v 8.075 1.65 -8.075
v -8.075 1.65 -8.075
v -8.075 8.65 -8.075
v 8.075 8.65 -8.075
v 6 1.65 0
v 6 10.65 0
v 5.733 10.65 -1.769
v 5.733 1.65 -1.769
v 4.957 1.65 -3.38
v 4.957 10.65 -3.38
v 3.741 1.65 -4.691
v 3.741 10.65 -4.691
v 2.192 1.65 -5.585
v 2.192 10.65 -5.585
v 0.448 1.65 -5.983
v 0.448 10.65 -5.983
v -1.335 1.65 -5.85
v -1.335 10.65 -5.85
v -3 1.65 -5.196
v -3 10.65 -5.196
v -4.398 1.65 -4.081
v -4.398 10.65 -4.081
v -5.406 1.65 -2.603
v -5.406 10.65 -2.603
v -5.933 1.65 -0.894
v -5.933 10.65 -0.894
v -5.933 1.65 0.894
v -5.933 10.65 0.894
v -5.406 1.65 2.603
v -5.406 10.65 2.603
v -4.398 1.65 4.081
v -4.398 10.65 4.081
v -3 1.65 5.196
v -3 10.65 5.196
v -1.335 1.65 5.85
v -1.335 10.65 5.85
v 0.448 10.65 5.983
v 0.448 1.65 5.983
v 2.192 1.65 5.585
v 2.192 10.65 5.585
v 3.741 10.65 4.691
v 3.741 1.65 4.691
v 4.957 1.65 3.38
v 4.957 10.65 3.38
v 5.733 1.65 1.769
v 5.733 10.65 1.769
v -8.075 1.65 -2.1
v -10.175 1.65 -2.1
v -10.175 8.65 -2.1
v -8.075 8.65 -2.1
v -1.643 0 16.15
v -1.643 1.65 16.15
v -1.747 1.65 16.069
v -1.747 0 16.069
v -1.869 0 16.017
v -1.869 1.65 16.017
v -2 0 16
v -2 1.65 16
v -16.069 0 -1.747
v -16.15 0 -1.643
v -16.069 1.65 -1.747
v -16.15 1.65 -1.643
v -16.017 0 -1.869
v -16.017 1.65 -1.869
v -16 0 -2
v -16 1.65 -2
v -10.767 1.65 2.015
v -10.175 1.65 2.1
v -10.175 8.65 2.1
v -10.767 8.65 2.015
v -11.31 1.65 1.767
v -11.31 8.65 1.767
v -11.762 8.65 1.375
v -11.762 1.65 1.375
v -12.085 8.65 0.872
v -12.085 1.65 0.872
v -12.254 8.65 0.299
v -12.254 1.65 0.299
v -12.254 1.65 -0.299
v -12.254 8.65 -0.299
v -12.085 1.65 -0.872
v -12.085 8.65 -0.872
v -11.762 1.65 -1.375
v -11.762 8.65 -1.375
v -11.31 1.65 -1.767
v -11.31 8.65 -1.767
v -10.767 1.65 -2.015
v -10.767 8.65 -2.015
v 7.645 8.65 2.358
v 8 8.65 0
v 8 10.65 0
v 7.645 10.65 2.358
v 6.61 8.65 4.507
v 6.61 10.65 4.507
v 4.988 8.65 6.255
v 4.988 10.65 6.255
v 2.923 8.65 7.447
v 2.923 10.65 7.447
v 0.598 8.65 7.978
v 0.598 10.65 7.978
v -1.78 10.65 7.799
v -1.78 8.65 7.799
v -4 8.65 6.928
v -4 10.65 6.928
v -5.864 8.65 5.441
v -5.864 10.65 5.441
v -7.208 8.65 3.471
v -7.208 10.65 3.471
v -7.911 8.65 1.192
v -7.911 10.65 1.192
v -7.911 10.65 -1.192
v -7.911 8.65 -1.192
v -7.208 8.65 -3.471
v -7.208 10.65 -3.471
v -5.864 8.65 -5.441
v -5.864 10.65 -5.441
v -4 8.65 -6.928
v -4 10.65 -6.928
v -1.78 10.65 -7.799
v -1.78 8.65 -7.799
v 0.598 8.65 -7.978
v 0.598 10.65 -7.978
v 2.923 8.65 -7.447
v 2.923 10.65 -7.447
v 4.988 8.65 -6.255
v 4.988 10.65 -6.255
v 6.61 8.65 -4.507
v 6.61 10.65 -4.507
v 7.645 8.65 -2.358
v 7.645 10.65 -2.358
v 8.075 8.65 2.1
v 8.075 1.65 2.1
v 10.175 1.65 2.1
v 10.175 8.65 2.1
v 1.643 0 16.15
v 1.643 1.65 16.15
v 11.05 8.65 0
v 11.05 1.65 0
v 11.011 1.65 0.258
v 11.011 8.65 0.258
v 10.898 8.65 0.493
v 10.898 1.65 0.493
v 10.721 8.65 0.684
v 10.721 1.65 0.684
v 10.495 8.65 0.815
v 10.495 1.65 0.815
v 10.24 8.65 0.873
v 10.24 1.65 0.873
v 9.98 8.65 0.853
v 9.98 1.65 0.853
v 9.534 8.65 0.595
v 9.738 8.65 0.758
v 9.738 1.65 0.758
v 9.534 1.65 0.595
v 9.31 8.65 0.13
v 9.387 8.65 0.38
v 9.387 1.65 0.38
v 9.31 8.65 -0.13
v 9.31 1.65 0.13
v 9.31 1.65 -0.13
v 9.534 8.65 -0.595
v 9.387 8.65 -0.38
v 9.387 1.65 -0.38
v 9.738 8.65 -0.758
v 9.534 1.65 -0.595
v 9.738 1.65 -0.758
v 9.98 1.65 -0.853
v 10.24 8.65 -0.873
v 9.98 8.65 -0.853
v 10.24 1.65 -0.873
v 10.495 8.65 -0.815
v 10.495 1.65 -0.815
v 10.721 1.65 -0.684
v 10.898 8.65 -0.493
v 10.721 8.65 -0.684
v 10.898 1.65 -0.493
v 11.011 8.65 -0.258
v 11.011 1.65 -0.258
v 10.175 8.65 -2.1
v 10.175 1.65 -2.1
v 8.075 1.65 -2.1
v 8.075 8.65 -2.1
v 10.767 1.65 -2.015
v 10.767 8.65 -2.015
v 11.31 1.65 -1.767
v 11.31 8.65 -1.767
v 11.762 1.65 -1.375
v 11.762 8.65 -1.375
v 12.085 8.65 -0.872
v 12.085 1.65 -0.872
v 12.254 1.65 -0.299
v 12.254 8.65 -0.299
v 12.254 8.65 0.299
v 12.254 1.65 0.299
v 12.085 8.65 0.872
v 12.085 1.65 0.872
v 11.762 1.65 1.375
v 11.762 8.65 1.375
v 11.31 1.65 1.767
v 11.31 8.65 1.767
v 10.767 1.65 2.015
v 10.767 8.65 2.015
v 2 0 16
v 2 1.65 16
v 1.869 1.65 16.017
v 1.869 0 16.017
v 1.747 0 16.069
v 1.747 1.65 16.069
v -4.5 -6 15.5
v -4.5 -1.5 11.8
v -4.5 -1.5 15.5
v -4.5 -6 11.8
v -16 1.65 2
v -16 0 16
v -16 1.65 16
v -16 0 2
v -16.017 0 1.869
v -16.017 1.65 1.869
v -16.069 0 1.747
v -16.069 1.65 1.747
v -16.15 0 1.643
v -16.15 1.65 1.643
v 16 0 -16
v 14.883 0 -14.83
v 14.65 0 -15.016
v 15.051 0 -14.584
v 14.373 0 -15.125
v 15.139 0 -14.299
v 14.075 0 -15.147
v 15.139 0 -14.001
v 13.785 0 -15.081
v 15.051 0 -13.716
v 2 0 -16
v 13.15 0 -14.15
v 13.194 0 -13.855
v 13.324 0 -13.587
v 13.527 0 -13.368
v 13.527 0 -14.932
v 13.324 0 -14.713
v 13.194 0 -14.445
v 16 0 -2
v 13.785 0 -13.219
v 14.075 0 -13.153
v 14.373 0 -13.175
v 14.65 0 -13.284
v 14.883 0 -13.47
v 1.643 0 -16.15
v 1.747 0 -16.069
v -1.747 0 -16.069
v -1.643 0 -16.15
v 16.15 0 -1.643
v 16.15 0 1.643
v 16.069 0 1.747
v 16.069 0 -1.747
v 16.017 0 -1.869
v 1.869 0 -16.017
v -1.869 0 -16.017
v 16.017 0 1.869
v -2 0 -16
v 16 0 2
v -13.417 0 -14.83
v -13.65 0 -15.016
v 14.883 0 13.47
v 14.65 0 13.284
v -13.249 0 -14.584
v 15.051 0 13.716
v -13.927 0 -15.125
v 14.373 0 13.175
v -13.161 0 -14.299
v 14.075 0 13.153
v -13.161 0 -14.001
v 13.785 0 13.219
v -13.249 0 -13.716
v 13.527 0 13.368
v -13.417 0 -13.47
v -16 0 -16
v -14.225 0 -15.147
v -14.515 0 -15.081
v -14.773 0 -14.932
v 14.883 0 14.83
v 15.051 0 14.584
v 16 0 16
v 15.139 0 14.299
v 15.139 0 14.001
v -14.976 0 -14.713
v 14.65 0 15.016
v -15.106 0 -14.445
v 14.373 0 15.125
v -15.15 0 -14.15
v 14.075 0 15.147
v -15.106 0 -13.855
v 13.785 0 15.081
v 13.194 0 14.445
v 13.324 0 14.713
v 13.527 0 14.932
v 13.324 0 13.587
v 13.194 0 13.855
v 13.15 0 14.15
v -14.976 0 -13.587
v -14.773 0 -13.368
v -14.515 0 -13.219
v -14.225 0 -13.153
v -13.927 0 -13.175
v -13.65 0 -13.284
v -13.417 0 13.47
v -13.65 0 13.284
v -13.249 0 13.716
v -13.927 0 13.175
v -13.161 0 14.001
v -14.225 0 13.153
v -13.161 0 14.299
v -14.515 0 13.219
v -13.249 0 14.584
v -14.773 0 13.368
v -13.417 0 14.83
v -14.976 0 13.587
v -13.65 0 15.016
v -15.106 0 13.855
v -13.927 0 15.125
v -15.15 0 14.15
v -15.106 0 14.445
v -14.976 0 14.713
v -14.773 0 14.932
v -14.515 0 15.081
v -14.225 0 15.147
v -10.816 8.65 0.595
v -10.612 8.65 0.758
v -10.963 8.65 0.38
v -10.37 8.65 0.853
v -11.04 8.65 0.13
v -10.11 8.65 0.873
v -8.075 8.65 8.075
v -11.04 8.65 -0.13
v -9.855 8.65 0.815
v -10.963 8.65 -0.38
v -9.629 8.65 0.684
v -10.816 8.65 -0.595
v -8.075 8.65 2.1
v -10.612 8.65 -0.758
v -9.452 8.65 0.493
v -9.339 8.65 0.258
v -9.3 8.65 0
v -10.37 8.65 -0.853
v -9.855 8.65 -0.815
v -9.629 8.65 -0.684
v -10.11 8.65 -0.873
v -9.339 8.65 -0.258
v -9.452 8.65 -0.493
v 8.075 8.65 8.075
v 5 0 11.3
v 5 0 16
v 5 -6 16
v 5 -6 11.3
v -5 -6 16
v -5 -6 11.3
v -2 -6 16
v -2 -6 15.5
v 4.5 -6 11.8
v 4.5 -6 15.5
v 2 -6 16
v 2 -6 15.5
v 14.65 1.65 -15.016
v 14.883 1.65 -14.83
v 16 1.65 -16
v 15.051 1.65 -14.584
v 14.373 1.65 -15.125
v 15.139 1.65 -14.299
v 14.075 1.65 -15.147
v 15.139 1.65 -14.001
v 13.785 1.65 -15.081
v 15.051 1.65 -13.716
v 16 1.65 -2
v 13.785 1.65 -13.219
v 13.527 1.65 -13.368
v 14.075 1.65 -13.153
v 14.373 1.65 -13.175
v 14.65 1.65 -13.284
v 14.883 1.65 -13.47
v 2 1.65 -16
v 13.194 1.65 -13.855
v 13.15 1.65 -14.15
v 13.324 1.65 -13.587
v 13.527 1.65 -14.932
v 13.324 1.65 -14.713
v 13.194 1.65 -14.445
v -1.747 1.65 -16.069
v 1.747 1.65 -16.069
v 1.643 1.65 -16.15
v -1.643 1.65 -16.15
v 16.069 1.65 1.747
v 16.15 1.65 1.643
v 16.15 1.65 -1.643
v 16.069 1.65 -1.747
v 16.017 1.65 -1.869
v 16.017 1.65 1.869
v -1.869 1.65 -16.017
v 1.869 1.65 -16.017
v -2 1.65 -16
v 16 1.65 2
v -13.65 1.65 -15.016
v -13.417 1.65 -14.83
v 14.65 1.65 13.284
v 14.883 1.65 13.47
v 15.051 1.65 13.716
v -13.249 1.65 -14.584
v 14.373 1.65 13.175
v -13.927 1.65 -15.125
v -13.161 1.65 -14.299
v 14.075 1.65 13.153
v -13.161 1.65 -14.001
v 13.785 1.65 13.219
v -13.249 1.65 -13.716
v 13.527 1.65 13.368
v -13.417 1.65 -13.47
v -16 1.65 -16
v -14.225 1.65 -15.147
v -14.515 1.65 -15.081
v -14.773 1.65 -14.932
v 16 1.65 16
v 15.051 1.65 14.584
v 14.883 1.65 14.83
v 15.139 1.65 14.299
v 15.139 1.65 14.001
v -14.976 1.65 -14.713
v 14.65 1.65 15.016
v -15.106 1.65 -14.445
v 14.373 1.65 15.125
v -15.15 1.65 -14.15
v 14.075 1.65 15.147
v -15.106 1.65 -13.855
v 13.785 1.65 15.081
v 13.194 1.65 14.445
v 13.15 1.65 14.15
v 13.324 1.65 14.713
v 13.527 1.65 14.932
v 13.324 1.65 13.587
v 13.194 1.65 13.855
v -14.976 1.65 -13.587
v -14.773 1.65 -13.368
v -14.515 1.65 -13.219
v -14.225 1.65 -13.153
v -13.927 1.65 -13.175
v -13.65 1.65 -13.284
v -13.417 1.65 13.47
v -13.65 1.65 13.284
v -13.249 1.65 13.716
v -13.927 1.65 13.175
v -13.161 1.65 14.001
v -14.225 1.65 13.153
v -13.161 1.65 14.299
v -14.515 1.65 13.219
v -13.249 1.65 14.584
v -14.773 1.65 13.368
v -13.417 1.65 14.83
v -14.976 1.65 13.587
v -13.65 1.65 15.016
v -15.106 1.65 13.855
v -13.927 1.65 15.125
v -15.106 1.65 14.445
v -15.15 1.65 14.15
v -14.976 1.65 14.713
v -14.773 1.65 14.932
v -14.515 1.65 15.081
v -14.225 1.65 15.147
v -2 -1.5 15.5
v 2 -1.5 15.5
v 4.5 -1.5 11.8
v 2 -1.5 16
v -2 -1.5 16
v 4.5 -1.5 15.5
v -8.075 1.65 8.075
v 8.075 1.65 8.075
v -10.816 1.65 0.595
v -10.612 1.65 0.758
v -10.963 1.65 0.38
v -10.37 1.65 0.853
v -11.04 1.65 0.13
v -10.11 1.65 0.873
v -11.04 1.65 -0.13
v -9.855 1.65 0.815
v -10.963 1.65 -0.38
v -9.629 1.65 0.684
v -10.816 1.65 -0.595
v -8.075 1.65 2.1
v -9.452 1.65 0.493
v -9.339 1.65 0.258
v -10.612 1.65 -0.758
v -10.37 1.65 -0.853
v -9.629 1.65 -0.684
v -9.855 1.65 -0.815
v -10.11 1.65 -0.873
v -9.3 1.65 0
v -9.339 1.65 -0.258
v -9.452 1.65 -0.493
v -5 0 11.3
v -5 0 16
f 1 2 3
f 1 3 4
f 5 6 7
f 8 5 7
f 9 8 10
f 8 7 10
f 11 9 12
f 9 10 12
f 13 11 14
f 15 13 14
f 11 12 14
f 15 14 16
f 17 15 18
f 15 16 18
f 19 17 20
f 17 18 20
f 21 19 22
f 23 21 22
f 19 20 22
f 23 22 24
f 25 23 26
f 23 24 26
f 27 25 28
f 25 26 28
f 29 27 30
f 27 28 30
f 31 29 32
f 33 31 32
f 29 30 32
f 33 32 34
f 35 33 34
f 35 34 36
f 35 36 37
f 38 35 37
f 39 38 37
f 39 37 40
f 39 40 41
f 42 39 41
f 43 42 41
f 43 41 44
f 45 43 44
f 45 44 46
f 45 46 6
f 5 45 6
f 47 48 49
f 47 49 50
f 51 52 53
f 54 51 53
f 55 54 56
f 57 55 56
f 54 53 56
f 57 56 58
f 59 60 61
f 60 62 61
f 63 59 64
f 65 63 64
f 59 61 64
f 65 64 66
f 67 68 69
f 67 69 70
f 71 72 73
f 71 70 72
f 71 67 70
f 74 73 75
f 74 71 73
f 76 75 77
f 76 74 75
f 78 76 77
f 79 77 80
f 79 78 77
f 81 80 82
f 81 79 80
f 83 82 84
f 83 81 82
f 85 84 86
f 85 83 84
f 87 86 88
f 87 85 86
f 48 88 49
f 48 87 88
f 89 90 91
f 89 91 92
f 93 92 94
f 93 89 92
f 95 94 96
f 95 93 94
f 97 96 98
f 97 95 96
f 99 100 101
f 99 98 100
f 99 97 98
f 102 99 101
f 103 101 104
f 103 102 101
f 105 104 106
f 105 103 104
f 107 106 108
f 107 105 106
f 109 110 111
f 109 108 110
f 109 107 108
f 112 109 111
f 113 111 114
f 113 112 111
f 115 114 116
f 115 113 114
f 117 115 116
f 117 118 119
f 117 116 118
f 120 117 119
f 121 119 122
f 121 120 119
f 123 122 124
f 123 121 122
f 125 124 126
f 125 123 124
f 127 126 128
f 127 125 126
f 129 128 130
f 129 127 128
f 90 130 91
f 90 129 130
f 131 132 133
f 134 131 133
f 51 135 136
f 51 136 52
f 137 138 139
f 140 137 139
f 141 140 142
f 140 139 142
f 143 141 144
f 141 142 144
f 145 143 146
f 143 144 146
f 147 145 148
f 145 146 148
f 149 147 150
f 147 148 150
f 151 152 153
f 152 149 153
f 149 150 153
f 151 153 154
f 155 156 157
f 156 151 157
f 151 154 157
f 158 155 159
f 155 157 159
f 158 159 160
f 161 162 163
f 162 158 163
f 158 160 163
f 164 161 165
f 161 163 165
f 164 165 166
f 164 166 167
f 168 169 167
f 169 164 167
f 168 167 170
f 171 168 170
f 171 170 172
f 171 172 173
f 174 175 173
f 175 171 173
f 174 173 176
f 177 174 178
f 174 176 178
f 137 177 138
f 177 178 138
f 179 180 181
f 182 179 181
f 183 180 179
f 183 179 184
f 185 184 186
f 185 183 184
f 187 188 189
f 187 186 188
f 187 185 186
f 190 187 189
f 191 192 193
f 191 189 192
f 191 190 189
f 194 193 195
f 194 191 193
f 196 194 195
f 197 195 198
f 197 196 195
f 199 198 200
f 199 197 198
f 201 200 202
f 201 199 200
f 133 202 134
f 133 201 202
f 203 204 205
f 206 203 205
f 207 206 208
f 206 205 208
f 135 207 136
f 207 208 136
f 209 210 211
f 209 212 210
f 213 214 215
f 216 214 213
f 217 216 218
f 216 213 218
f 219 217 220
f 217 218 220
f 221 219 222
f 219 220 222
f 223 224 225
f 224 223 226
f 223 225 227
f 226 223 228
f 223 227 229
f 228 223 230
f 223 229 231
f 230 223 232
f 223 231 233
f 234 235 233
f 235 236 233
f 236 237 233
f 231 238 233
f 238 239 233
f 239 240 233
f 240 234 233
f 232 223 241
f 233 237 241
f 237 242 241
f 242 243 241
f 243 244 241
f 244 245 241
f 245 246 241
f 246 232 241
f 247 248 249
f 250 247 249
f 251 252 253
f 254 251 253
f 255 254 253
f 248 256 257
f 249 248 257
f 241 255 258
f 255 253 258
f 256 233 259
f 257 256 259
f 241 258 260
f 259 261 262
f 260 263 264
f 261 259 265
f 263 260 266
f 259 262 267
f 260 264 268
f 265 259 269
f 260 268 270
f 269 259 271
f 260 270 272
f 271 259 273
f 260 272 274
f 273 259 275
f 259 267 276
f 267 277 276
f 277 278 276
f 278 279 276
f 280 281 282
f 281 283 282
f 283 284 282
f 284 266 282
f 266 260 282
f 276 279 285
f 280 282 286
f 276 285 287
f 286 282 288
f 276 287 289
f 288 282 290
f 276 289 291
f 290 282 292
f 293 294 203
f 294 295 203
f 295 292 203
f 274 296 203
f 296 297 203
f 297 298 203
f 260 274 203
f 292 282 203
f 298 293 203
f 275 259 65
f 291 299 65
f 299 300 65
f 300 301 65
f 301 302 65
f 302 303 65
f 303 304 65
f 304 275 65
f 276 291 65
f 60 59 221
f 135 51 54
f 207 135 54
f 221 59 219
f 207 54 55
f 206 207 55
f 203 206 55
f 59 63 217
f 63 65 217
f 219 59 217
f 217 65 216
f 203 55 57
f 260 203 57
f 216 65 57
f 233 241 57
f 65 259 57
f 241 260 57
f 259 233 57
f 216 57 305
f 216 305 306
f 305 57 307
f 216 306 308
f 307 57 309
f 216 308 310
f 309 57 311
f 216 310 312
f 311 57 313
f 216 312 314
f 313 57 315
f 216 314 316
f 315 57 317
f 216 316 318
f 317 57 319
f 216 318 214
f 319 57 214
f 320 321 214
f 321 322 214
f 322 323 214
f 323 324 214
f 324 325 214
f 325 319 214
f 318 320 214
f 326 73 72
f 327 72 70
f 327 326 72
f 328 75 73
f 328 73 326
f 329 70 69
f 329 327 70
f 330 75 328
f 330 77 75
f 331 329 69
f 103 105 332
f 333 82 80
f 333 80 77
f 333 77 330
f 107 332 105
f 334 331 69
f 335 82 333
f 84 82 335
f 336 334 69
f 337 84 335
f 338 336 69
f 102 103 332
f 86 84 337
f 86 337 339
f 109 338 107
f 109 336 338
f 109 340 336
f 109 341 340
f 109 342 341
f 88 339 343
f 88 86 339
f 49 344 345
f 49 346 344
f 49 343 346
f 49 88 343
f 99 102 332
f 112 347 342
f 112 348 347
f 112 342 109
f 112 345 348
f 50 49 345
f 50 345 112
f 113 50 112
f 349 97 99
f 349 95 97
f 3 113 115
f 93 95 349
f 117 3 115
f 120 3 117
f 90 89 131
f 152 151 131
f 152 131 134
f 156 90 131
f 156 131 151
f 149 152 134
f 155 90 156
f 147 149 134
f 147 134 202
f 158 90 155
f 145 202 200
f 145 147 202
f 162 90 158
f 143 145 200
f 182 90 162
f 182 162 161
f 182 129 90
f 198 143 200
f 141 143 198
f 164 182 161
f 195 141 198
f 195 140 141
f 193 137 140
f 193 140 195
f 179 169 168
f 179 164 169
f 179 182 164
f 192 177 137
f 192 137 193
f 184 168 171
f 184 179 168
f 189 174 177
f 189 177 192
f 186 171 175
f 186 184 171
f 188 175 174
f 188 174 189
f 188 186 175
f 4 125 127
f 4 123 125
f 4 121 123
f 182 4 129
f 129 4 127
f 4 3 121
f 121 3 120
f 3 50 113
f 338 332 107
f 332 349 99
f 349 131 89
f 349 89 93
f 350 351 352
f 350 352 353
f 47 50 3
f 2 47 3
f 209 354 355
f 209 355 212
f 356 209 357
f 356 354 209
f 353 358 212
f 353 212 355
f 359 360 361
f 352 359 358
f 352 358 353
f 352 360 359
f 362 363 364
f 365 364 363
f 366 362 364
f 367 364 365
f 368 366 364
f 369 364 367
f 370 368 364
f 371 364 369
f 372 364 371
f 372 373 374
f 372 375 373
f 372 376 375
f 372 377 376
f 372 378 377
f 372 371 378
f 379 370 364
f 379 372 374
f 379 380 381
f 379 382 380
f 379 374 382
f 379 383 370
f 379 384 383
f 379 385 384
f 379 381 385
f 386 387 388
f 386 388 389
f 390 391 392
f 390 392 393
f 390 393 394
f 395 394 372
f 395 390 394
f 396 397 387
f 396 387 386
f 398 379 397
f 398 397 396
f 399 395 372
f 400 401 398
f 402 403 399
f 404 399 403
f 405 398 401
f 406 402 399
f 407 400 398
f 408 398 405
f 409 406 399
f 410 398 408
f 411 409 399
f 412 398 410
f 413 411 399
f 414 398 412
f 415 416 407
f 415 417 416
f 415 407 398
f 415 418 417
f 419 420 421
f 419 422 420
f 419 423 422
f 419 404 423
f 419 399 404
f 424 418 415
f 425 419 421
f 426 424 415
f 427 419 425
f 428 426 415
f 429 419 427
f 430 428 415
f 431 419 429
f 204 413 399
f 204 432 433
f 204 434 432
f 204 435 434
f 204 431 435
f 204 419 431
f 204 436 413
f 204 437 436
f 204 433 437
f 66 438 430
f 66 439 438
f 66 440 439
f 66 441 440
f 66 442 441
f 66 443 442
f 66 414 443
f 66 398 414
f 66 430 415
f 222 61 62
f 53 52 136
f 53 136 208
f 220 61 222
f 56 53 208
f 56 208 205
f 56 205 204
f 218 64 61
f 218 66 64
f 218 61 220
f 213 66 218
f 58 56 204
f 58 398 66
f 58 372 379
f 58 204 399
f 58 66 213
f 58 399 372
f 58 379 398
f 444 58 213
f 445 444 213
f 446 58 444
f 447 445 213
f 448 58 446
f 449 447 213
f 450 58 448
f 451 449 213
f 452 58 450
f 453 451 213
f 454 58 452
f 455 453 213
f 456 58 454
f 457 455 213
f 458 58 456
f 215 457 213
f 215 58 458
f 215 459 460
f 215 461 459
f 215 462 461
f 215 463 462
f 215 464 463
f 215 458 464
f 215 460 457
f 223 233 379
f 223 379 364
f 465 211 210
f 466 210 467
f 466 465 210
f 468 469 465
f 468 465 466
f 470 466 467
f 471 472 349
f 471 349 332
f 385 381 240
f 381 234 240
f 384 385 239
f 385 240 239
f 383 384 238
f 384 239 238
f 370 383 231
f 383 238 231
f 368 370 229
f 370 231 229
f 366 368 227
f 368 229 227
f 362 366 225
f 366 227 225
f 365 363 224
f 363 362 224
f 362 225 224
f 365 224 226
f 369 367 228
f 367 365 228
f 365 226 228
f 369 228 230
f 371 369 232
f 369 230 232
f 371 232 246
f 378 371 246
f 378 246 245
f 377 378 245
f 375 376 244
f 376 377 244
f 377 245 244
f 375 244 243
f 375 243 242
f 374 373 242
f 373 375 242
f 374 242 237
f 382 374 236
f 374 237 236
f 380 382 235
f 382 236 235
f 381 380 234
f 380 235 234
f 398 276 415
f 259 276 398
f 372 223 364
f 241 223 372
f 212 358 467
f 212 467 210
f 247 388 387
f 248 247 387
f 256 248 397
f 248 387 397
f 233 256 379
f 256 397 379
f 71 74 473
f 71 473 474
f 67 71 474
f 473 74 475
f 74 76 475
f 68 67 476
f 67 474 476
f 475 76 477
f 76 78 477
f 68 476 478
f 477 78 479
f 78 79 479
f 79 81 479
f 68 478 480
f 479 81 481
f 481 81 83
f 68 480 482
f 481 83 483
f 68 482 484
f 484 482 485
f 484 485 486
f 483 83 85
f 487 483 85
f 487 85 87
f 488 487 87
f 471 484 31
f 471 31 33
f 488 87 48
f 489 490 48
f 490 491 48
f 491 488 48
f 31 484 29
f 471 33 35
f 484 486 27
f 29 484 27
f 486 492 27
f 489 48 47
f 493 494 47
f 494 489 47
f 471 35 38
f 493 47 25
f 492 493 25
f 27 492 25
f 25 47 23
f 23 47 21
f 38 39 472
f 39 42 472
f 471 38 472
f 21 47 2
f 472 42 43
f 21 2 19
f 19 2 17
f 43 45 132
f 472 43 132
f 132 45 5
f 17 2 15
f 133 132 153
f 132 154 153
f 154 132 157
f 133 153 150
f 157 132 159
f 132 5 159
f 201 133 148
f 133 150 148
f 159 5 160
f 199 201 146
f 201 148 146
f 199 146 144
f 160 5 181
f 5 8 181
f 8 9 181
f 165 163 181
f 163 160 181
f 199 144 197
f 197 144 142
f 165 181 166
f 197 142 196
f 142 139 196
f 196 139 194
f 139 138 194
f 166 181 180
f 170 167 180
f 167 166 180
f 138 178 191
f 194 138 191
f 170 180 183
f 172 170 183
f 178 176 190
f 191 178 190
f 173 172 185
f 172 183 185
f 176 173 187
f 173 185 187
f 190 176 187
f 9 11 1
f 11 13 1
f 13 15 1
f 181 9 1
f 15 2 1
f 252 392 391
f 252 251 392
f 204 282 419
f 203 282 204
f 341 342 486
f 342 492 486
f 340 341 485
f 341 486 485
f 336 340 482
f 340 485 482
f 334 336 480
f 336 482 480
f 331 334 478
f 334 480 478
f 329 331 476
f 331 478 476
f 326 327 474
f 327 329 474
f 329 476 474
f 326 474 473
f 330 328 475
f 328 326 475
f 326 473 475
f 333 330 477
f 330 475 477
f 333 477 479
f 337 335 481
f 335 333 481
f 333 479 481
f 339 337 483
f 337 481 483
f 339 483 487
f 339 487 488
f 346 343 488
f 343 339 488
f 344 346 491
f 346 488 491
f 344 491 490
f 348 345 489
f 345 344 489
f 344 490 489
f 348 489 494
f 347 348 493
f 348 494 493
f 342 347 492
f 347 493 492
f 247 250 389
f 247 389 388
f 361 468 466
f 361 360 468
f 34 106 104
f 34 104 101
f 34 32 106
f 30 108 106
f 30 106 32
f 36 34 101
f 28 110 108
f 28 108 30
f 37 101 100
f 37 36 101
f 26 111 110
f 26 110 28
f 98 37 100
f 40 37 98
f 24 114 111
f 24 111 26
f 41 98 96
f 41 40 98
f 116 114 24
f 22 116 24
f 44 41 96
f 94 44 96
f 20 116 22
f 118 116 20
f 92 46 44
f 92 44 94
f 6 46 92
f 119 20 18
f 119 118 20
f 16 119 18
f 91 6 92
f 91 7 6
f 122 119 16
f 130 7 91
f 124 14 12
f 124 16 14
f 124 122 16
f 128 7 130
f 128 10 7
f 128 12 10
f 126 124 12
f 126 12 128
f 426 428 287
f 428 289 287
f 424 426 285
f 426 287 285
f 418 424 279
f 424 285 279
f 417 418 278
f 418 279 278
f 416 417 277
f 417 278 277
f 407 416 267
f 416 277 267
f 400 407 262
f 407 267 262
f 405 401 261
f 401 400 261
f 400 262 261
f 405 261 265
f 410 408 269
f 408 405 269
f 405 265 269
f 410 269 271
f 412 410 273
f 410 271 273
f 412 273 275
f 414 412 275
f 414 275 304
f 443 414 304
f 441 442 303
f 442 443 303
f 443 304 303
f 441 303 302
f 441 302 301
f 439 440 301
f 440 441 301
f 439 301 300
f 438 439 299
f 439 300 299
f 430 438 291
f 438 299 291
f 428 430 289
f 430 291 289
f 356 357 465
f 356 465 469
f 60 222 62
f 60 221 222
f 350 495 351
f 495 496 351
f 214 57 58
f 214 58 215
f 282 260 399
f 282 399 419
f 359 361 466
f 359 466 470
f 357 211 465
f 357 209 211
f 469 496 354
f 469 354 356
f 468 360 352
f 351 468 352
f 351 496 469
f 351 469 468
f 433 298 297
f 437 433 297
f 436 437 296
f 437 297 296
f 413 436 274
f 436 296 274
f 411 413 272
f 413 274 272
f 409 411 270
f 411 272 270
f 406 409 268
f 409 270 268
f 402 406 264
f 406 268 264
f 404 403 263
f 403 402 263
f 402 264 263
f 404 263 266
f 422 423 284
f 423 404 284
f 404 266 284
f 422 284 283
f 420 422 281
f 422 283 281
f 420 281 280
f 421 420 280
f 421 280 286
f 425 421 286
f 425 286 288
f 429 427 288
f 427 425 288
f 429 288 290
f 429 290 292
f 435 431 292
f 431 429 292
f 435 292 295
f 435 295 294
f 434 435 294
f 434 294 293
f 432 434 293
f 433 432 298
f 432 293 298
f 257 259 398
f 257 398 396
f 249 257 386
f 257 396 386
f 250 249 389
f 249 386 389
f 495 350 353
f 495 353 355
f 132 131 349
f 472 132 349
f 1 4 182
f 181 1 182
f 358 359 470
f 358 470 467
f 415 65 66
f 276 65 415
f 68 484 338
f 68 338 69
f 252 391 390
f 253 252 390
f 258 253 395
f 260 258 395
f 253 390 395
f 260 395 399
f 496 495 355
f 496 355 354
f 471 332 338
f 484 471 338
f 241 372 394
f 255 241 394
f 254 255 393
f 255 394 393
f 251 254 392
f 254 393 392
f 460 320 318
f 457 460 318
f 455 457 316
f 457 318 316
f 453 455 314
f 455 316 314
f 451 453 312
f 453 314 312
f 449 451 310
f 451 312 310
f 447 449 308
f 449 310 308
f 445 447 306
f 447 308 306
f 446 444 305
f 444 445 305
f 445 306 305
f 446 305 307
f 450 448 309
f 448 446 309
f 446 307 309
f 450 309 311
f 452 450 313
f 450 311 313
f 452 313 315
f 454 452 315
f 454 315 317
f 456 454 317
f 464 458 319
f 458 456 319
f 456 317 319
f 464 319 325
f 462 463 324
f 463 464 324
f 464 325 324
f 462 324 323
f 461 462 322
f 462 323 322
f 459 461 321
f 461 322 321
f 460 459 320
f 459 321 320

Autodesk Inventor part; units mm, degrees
ref_plane "YZ Plane" through (0, 0, 0) normal (1, 0, 0) x (0, 1, 0)
ref_plane "XZ Plane" through (0, 0, 0) normal (0, 1, 0) x (-1, 0, 0)
ref_plane "XY Plane" through (0, 0, 0) normal (0, 0, 1) x (1, 0, 0)
sketch "Sketch1" plane through (0, 0, 0) normal (0, 1, 0) x (-1, 0, 0)
  line L0 (-19, 19) -> (19, 19)
  line L1 (19, 19) -> (19, -19)
  line L2 (19, -19) -> (-19, -19)
  line L3 (-19, -19) -> (-19, 19)
  line L4 (-19, 19) -> (19, -19) construction
  line L5 (19, 19) -> (-19, -19) construction
  line L6 (-17, -17) -> (17, -17)
  line L7 (17, -17) -> (17, 17)
  line L8 (17, 17) -> (-17, 17)
  line L9 (-17, 17) -> (-17, -17)
  line L10 (16, -16) -> (-16, -16)
  line L11 (-16, -16) -> (-16, 16)
  line L12 (-16, 16) -> (16, 16)
  line L13 (16, 16) -> (16, -16)
  circle A0 centre (17, -17) radius 1
  circle A1 centre (-17, -17) radius 1
  circle A2 centre (-17, 17) radius 1
  circle A3 centre (17, 17) radius 1
  line L14 (16, 16) -> (14.15, 16) construction
  line L15 (14.15, 16) -> (14.15, 14.15) construction
  line L16 (14.15, 14.15) -> (16, 14.15) construction
  line L17 (16, 14.15) -> (16, 16) construction
  circle A4 centre (14.15, 14.15) radius 1
  circle A5 centre (-14.15, 14.15) radius 1
  circle A6 centre (-14.15, -14.15) radius 1
  circle A7 centre (14.15, -14.15) radius 1
  line L18 (0, 16) -> (0, 17) construction
  line L19 (-1.5, 17) -> (1.5, 17)
  line L20 (1.5, 17) -> (1.5, 16)
  line L21 (1.5, 16) -> (-1.5, 16)
  line L22 (-1.5, 16) -> (-1.5, 17)
  line L23 (-1.5, 17) -> (1.5, 16) construction
  line L24 (1.5, 17) -> (-1.5, 16) construction
  line L25 (-17, 1.5) -> (-16, 1.5)
  line L26 (-16, 0) -> (-17, 0) construction
  line L27 (-16, 1.5) -> (-16, -1.5)
  line L28 (-16, -1.5) -> (-17, -1.5)
  line L29 (-17, -1.5) -> (-17, 1.5)
  line L30 (-17, 1.5) -> (-16, -1.5) construction
  line L31 (-17, -1.5) -> (-16, 1.5) construction
  line L32 (-1.5, -17) -> (-1.5, -16)
  line L33 (0, -16) -> (0, -17) construction
  line L34 (-1.5, -16) -> (1.5, -16)
  line L35 (1.5, -16) -> (1.5, -17)
  line L36 (1.5, -17) -> (-1.5, -17)
  line L37 (-1.5, -17) -> (1.5, -16) construction
  line L38 (1.5, -17) -> (-1.5, -16) construction
  line L39 (17, -1.5) -> (16, -1.5)
  line L40 (16, 0) -> (17, 0) construction
  line L41 (16, -1.5) -> (16, 1.5)
  line L42 (16, 1.5) -> (17, 1.5)
  line L43 (17, 1.5) -> (17, -1.5)
  line L44 (17, -1.5) -> (16, 1.5) construction
  line L45 (17, 1.5) -> (16, -1.5) construction
  point P0 (0, 0)
  point P1 (0, 16.5)
  point P2 (-16.5, 0)
  point P3 (0, -16.5)
  point P4 (16.5, 0)
  dimension "d49" = 2
  dimension "d0" = 38
  dimension "d1" = 38
  dimension "d2" = 2
  dimension "d3" = 1
  dimension "d4" = 2
  dimension "d5" = 2
  dimension "d6" = 2
  dimension "d7" = 2
  dimension "d8" = 1.85
  dimension "d9" = 1.85
  dimension "d10" = 2
  dimension "d13" = 360
  dimension "d15" = 3
  dimension "d18" = 360
extrude "Extrusion1" add sketch "Sketch1" along normal blind 1.65 contours L0 L1 L2 L3 | L32 L10 L35 L6 | L9 L25 L11 L28 | L10 L11 L12 L13 | L39 L13 L42 L7 | L8 L20 L12 L22
fillet "Fillet1" radius 0.5 16 edges at (-17, 0.825, 1.5) (-16, 0.825, 1.5) (-17, 0.825, -1.5) (-16, 0.825, -1.5) (-1.5, 0.825, -16) (1.5, 0.825, -16) (1.5, 0.825, -17) (-1.5, 0.825, -17) (16, 0.825, -1.5) (17, 0.825, -1.5) (17, 0.825, 1.5) (16, 0.825, 1.5) (1.5, 0.825, 16) (-1.5, 0.825, 16) (-1.5, 0.825, 17) (1.5, 0.825, 17)
sketch "Sketch2" plane through (0, 1.65, 0) normal (0, 1, 0) x (1, 0, 0)
  line L0 (8.075, -8.075) -> (-8.075, -8.075)
  line L1 (-8.075, -8.075) -> (-8.075, 8.075)
  line L2 (-8.075, 8.075) -> (8.075, 8.075)
  line L3 (8.075, 8.075) -> (8.075, -8.075)
  line L4 (8.075, -8.075) -> (-8.075, 8.075) construction
  line L5 (-8.075, -8.075) -> (8.075, 8.075) construction
  line L6 (-8.075, 0) -> (-10.175, 0) construction
  line L7 (8.075, 0) -> (10.175, 0) construction
  line L8 (-8.075, -2.1) -> (-10.175, -2.1)
  line L9 (-12.275, 0) -> (-12.275, 0)
  line L10 (-10.175, 2.1) -> (-8.075, 2.1)
  line L11 (-8.075, 2.1) -> (-8.075, -2.1)
  line L12 (-8.075, -2.1) -> (-12.275, 2.1) construction
  line L13 (-12.275, -2.1) -> (-8.075, 2.1) construction
  line L14 (8.075, -2.1) -> (10.175, -2.1)
  line L15 (12.275, 0) -> (12.275, 0)
  line L16 (10.175, 2.1) -> (8.075, 2.1)
  line L17 (8.075, 2.1) -> (8.075, -2.1)
  line L18 (8.075, -2.1) -> (12.275, 2.1) construction
  line L19 (12.275, -2.1) -> (8.075, 2.1) construction
  arc A0 (-10.175, 2.1) -> (-12.275, 0) centre (-10.175, 0) ccw
  arc A1 (-12.275, 0) -> (-10.175, -2.1) centre (-10.175, 0) ccw
  arc A2 (10.175, -2.1) -> (12.275, 0) centre (10.175, 0) ccw
  arc A3 (12.275, 0) -> (10.175, 2.1) centre (10.175, 0) ccw
  circle A4 centre (-10.175, 0) radius 0.875
  circle A5 centre (10.175, 0) radius 0.875
  point P0 (0, 0)
  dimension "d23" = 16.15
  dimension "d24" = 16.15
  dimension "d25" = 2.1
  dimension "d26" = 2.1
  dimension "d27" = 4.2
  dimension "d28" = 4.2
  dimension "d29" = 4.2
  dimension "d30" = 4.2
  dimension "d31" = 2.1
  dimension "d34" = 1.75
  dimension "d35" = 1.75
extrude "Extrusion2" add sketch "Sketch2" along normal blind 7 separate body
sketch "Sketch3" plane through (0, 0, 0) normal (0, -1, 0) x (1, 0, 0)
  line L0 (5, 11.3) -> (-5, 11.3)
  line L1 (-5, 11.3) -> (-5, 16)
  line L2 (-5, 16) -> (5, 16)
  line L3 (5, 16) -> (5, 11.3)
  line L4 (2, 16) -> (16, 16) projected
  point P0 (0, 0)
  dimension "d36" = 10
  dimension "d37" = 4.7
  dimension "d38" = 5
extrude "Extrusion3" add sketch "Sketch3" along normal blind 6 separate body
sketch "Sketch4" plane through (0, -6, 0) normal (0, -1, 0) x (1, 0, 0)
  line L0 (-5, 11.3) -> (5, 11.3) projected
  line L1 (5, 11.3) -> (5, 16) projected
  line L2 (5, 16) -> (-5, 16) projected
  line L3 (-5, 16) -> (-5, 11.3) projected
  line L4 (4.5, 11.8) -> (-4.5, 11.8)
  line L5 (-4.5, 11.8) -> (-4.5, 15.5)
  line L6 (-4.5, 15.5) -> (4.5, 15.5)
  line L7 (4.5, 15.5) -> (4.5, 11.8)
  line L8 (5, 16) -> (-5, 16) projected
  line L9 (2, 15.5) -> (-2, 15.5)
  line L10 (-2, 15.5) -> (-2, 16)
  line L11 (-2, 16) -> (2, 16)
  line L12 (2, 16) -> (2, 15.5)
  point P0 (0, 0)
  dimension "d41" = 0.5
  dimension "d42" = 4
  dimension "d43" = 2
extrude "Extrusion4" cut sketch "Sketch4" against normal blind 4.5 contours L2 L12 L6 L10 | L6 L7 L4 L5 bodies 3
sketch "Sketch5" plane through (0, 8.65, 0) normal (0, 1, 0) x (1, 0, 0)
  circle A0 centre (0, 0) radius 8
  dimension "d46" = 16
extrude "Extrusion5" add sketch "Sketch5" along normal blind 2 bodies 2
sketch "Sketch6" plane through (0, 10.65, 0) normal (0, 1, 0) x (1, 0, 0)
  circle A0 centre (0, 0) radius 8 construction
  circle A1 centre (0, 0) radius 6
  dimension "d49" = 2
extrude "Extrusion6" cut sketch "Sketch6" against normal up to surface (9 mm away) bodies 2
thread "Thread1" size "M12x0.5" class "6H" standard "ANSI Metric M Profile" full length
sketch "Sketch7" plane through (0, 0, 0) normal (0, -1, 0) x (1, 0, 0)
  line L0 (16, 16) -> (-16, 16) construction
  line L1 (-16, 16) -> (-16, -16) construction
  line L2 (-16, -16) -> (16, -16) construction
  line L3 (16, -16) -> (16, 16) construction
  line L4 (16.15, 16.15) -> (-16.15, 16.15)
  line L5 (-16.15, 16.15) -> (-16.15, -16.15)
  line L6 (-16.15, -16.15) -> (16.15, -16.15)
  line L7 (16.15, -16.15) -> (16.15, 16.15)
  line L8 (21.15, 21.15) -> (-21.15, 21.15)
  line L9 (-21.15, 21.15) -> (-21.15, -21.15)
  line L10 (-21.15, -21.15) -> (21.15, -21.15)
  line L11 (21.15, -21.15) -> (21.15, 21.15)
  point P0 (0, 0)
  dimension "d54" = 0.15
  dimension "d55" = 5
extrude "Extrusion7" cut sketch "Sketch7" against normal up to surface (1.65 mm away) bodies 1
equation "\"d38\" = 0.5 * d36"
properties part number "Spinel USB Camera 01 trimmed"
